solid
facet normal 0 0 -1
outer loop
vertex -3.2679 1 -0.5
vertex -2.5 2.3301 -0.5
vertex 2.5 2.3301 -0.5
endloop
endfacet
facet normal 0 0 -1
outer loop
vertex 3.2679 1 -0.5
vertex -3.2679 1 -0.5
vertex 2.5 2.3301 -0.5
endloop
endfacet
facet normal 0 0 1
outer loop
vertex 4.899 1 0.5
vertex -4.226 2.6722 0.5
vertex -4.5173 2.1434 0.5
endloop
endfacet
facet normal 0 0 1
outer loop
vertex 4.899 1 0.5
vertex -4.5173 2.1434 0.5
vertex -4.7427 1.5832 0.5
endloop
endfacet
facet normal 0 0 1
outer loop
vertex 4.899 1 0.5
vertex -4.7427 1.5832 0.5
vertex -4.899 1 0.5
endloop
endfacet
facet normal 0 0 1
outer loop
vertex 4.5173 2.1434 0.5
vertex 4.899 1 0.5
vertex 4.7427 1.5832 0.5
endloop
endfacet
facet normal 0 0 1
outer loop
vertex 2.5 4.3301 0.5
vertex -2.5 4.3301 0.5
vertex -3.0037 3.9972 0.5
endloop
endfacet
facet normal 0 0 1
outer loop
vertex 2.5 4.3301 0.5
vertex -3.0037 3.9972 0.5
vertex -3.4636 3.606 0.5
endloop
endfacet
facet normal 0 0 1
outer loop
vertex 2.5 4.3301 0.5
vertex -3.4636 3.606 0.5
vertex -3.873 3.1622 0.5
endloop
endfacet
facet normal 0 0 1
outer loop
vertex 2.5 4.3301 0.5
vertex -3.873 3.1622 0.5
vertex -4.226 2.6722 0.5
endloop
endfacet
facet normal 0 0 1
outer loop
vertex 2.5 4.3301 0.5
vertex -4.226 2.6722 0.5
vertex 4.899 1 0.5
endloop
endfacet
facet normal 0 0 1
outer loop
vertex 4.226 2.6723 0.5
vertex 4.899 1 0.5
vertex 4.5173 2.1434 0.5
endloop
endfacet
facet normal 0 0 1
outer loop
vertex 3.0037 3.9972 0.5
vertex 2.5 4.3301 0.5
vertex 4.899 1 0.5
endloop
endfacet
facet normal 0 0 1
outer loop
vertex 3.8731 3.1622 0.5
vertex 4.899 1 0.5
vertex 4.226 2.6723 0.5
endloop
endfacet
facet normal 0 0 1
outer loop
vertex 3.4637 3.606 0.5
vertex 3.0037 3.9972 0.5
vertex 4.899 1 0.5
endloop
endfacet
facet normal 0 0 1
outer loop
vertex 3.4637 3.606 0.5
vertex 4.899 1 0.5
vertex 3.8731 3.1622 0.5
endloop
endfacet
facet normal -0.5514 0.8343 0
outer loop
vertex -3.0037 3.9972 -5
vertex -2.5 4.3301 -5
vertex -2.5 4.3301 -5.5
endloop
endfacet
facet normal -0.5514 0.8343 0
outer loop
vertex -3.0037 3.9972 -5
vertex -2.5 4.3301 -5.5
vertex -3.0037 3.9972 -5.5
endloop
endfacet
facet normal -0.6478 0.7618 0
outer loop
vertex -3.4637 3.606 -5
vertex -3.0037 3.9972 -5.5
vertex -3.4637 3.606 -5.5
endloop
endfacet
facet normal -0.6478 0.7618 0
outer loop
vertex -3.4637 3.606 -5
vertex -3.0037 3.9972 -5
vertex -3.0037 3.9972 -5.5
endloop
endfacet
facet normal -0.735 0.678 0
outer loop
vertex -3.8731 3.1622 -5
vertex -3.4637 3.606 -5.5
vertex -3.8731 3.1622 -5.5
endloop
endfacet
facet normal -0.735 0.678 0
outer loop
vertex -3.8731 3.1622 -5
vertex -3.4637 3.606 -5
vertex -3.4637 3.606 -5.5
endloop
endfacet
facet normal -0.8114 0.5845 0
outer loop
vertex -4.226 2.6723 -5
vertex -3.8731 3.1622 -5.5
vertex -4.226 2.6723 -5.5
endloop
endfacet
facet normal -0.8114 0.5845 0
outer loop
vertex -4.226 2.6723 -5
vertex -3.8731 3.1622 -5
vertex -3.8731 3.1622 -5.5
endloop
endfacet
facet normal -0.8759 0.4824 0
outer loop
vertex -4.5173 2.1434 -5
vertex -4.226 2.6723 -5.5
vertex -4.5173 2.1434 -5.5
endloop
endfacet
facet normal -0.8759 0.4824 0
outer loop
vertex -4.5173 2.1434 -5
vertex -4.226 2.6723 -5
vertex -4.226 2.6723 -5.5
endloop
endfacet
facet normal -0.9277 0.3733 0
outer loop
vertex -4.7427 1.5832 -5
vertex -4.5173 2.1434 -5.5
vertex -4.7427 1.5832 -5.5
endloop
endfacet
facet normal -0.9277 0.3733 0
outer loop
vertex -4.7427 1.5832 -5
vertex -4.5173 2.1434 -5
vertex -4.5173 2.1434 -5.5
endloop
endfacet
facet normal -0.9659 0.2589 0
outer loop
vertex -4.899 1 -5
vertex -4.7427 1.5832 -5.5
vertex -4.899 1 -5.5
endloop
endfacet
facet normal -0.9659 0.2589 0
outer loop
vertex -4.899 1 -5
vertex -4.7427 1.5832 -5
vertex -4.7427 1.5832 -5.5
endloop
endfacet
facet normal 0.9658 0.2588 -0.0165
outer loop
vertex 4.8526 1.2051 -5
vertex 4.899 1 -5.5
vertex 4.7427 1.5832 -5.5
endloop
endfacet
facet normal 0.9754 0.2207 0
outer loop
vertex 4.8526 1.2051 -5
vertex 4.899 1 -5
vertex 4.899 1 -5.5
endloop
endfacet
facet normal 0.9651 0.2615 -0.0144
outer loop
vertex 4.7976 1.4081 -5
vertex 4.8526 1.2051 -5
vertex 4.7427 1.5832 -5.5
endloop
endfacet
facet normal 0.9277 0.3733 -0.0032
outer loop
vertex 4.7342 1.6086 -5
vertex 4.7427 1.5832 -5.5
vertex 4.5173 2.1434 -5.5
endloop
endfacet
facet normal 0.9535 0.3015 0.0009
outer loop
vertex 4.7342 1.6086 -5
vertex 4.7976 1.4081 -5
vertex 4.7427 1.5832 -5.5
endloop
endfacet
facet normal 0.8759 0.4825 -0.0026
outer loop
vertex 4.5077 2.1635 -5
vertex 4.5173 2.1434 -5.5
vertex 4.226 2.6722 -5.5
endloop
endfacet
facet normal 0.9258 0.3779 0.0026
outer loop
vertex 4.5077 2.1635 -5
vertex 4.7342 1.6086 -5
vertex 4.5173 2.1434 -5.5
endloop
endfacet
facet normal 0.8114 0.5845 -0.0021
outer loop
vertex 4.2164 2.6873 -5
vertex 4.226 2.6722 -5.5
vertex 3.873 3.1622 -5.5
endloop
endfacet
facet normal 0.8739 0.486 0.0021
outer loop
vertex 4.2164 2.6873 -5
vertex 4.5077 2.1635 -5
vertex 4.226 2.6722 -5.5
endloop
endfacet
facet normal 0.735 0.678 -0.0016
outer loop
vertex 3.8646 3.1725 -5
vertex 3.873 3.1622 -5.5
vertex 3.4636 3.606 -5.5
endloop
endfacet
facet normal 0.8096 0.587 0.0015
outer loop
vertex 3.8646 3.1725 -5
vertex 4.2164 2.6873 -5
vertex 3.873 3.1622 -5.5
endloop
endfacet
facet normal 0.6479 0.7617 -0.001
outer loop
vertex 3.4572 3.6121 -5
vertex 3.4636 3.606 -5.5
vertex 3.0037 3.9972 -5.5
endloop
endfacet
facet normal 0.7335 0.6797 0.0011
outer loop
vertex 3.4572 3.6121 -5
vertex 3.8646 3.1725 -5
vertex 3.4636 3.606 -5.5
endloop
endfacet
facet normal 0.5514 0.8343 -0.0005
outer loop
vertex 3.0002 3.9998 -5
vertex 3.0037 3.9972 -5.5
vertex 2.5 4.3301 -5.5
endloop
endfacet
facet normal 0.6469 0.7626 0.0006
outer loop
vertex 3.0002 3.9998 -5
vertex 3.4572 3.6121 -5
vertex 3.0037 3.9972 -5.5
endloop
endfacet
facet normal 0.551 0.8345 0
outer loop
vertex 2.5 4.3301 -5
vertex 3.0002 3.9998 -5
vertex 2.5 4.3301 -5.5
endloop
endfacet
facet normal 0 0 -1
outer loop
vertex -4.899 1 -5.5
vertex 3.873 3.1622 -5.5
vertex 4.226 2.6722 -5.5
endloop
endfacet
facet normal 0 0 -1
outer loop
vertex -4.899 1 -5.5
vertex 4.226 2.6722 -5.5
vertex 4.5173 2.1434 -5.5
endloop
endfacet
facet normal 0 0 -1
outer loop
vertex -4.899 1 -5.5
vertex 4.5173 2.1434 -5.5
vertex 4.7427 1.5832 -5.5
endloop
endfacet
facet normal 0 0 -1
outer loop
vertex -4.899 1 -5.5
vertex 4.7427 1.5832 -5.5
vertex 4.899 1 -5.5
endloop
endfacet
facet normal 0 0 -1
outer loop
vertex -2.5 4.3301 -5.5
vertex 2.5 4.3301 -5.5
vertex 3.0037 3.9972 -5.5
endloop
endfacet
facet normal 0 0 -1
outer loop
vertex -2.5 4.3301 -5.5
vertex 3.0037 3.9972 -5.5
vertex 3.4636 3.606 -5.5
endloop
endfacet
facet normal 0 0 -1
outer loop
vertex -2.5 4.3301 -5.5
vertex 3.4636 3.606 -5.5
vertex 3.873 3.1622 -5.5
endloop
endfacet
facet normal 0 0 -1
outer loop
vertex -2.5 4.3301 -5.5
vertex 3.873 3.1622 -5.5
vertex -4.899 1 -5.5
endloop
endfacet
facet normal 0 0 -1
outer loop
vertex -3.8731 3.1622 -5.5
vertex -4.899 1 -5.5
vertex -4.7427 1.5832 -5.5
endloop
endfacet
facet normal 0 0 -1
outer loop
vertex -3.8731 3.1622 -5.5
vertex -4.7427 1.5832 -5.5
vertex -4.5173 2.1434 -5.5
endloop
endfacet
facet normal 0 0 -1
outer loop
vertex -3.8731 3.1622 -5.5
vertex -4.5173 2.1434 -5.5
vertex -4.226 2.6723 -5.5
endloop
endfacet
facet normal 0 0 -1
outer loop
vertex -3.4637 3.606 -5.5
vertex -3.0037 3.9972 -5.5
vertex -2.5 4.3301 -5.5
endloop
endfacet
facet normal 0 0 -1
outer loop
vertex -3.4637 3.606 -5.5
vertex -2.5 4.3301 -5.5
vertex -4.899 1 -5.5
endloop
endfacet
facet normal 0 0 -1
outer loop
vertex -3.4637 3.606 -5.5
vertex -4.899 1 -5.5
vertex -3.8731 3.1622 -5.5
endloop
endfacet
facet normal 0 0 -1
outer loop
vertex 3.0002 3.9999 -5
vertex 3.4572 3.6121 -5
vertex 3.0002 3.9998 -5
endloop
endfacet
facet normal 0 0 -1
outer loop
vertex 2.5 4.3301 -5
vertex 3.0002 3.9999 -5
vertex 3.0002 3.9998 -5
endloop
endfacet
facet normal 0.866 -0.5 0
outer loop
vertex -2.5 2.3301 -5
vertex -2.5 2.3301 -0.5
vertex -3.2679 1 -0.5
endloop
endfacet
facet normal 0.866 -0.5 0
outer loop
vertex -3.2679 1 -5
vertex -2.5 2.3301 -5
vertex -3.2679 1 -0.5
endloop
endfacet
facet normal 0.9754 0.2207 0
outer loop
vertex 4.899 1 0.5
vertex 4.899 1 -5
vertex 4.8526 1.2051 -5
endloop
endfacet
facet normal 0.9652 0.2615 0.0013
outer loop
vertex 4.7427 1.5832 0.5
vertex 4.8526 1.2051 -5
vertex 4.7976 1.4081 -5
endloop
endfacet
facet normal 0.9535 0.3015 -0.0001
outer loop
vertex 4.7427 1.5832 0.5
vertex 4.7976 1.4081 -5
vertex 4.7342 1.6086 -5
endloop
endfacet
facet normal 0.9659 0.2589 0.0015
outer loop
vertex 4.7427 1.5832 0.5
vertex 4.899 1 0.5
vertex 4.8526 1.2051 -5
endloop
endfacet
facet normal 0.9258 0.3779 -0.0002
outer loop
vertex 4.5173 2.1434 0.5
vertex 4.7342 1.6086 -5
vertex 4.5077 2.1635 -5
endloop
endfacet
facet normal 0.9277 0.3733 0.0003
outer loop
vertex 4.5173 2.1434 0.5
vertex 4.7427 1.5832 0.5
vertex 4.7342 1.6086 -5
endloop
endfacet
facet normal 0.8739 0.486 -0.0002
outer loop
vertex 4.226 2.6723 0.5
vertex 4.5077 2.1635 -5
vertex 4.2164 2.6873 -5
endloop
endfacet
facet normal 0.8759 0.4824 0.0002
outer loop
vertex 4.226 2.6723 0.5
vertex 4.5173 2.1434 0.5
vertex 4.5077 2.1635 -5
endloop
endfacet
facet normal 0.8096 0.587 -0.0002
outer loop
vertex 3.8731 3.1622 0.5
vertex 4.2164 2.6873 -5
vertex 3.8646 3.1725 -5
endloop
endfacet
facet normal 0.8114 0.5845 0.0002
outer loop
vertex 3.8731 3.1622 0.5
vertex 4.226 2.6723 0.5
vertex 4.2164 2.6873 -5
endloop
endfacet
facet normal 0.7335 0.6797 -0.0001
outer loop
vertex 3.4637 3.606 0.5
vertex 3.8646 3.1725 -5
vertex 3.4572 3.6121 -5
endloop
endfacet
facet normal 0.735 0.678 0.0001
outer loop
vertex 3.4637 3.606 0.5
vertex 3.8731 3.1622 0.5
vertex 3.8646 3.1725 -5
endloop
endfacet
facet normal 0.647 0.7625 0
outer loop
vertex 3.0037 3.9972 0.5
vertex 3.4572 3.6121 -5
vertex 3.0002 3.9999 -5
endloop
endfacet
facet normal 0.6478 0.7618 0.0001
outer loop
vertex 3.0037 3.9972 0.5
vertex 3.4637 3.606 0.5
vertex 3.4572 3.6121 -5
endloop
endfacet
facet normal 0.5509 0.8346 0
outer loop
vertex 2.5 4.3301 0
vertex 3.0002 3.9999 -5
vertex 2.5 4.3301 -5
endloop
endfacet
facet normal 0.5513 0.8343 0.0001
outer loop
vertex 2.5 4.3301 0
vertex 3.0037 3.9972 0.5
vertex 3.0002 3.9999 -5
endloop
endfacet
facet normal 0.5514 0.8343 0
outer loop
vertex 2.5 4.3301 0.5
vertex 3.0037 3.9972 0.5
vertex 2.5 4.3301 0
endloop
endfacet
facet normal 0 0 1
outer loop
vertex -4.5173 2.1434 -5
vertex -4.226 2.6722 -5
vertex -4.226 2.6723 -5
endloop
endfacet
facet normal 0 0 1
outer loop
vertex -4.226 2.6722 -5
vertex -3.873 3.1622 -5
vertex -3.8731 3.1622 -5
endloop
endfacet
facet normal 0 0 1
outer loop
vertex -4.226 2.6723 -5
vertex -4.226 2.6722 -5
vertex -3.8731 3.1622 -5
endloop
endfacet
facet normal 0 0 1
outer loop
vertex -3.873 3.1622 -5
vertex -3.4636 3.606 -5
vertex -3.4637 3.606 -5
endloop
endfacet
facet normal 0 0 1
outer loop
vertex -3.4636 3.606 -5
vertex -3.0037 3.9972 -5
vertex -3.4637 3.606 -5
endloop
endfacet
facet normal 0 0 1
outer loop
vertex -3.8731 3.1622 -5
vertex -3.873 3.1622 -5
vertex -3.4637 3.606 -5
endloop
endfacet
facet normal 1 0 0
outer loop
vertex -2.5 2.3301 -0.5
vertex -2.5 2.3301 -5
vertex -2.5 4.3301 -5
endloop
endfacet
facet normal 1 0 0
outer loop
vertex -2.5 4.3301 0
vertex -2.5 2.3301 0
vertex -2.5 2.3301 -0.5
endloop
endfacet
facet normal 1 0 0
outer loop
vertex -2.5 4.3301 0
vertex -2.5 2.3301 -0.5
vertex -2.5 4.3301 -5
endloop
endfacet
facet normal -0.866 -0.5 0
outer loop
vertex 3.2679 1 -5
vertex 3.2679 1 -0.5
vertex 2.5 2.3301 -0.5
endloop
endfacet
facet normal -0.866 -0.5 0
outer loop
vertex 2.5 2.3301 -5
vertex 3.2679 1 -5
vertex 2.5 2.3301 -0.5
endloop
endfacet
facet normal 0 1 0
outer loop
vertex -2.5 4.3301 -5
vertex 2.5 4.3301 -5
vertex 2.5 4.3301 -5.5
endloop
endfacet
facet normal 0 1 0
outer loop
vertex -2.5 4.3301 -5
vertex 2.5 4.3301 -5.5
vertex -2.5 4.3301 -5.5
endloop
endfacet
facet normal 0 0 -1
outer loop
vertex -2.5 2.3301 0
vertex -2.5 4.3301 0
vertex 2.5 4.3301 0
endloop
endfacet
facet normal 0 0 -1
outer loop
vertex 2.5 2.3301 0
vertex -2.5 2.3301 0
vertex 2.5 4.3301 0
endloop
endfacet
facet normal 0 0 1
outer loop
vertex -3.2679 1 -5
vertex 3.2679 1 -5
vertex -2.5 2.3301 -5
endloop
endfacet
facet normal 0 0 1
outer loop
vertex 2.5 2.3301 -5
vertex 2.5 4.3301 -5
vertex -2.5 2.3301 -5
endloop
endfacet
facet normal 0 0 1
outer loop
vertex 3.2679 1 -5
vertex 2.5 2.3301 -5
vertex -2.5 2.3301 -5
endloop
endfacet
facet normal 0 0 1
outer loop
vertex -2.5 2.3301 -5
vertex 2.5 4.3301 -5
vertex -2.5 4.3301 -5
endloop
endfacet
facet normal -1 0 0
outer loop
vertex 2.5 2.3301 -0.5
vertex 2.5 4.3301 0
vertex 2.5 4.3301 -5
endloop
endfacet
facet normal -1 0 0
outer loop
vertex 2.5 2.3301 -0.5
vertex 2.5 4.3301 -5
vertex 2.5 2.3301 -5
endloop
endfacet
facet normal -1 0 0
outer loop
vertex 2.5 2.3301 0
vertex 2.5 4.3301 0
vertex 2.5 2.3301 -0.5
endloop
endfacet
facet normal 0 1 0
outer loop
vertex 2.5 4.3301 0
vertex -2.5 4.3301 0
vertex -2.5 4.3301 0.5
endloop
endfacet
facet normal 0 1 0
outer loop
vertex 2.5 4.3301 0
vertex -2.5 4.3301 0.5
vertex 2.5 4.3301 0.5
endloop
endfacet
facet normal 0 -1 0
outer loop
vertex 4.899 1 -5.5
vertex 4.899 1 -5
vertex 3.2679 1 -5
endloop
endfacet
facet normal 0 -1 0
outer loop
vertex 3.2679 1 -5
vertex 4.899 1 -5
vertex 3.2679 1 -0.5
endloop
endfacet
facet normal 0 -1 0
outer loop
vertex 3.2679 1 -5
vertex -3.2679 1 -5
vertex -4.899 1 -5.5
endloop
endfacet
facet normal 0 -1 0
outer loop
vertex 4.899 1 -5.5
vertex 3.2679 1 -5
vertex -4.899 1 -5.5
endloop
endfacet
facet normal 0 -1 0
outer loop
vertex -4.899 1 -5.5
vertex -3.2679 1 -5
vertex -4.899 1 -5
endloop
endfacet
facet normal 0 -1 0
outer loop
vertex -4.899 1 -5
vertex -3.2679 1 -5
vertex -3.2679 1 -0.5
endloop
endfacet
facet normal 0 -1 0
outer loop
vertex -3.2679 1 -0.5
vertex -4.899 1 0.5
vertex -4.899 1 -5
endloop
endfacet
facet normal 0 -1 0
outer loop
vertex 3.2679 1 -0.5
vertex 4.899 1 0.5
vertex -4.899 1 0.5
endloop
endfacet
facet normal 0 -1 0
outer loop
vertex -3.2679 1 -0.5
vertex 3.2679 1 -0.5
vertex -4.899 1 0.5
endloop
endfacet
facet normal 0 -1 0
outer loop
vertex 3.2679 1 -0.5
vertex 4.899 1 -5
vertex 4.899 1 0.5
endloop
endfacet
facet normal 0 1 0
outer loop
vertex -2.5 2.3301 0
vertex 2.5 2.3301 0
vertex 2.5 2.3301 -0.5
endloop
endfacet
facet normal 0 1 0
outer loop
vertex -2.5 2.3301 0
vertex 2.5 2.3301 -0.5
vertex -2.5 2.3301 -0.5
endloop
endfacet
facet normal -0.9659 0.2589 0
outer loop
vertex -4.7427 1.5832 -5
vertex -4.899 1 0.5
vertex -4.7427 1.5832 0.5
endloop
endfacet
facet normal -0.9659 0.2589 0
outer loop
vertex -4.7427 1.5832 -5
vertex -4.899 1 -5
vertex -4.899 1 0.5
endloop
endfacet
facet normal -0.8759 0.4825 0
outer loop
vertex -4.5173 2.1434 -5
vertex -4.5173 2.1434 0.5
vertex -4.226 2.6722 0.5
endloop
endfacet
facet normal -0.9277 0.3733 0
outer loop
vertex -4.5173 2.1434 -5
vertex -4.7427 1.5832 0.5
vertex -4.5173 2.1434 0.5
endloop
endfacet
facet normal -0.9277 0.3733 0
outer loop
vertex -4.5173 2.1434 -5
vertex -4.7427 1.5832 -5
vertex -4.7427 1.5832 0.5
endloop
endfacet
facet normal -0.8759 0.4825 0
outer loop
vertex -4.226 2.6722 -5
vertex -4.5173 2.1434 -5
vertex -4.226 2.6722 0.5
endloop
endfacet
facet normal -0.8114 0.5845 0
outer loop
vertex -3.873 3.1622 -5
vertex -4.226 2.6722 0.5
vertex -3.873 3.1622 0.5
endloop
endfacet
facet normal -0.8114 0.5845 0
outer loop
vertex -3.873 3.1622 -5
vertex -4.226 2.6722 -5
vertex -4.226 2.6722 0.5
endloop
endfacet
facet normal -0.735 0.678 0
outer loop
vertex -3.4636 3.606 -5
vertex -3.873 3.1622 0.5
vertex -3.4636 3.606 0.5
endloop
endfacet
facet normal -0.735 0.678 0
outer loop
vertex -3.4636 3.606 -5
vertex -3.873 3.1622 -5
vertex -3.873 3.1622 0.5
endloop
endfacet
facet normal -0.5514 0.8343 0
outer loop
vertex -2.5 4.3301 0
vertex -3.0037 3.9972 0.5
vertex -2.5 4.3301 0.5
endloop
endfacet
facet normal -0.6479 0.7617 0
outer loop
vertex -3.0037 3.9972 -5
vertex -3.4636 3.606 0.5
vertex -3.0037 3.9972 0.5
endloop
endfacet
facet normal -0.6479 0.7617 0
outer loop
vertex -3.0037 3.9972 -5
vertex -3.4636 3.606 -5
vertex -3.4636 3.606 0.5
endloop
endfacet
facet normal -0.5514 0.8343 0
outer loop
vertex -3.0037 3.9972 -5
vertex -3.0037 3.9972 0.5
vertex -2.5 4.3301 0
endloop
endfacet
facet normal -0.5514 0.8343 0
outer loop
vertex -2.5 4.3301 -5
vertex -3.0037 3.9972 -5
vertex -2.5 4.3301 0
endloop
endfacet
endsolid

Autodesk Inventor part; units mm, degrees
ref_plane "YZ Plane" through (0, 0, 0) normal (1, 0, 0) x (0, 1, 0)
ref_plane "XZ Plane" through (0, 0, 0) normal (0, 1, 0) x (-1, 0, 0)
sketch "Sketch9" plane through (0, 0, 0) normal (0, 0, 1) x (1, 0, 0)
  line L0 (5, 0) -> (2.5, -4.3301)
  line L1 (2.5, -4.3301) -> (-2.5, -4.3301)
  line L2 (-2.5, -4.3301) -> (-5, 0)
  line L3 (-5, 0) -> (-2.5, 4.3301)
  line L4 (-2.5, 4.3301) -> (2.5, 4.3301)
  line L5 (2.5, 4.3301) -> (5, 0)
  line L6 (2.5, 4.3301) -> (2.5, 2.3301)
  line L7 (2.5, 2.3301) -> (-2.5, 2.3301)
  line L8 (-2.5, 2.3301) -> (-2.5, 4.3301)
  line L9 (-2.5, -4.3301) -> (-5, 0)
  line L10 (-0.7679, -3.3301) -> (-2.5, -4.3301)
  line L11 (-3.2679, 1) -> (-0.7679, -3.3301)
  line L12 (-5, 0) -> (-3.2679, 1)
  line L13 (5, 0) -> (2.5, -4.3301)
  line L14 (3.2679, 1) -> (5, 0)
  line L15 (0.7679, -3.3301) -> (3.2679, 1)
  line L16 (2.5, -4.3301) -> (0.7679, -3.3301)
  point P0 (0, 0)
  point P1 (0, 0)
  point P2 (-5, 0)
  dimension "d62" = 5
  dimension "d63" = 2
  dimension "d66" = 360
extrude "Extrusion9" add sketch "Sketch9" against normal blind 0.5 contours L14 L15 L16 L1 L10 L11 L12 L3 L8 L7 L6 L5
sketch "Sketch11" plane through (0, 0, -0.5) normal (0, 0, -1) x (-1, 0, 0)
  line L0 (2.5, 2.3301) -> (-2.5, 2.3301) projected
  line L1 (-2.5, 2.3301) -> (-2.5, 4.3301) projected
  line L2 (-2.5, 2.3301) -> (-2.5, 4.3301)
  line L3 (-5, 0) -> (-2.5, 4.3301) projected
  line L4 (-2.5, 4.3301) -> (-5, 0)
  line L5 (-3.2679, 1) -> (-0.7679, -3.3301) projected
  line L6 (-5, 0) -> (-3.2679, 1)
  line L7 (-3.2679, 1) -> (-2.5, 2.3301)
  line L8 (2.5, 4.3301) -> (2.5, 2.3301) projected
  line L9 (2.5, 4.3301) -> (2.5, 2.3301)
  line L10 (2.5, 2.3301) -> (3.2679, 1)
  line L11 (3.2679, 1) -> (5, 0)
  line L12 (5, 0) -> (2.5, 4.3301)
  line L13 (-0.7679, -3.3301) -> (-2.5, -4.3301)
  line L14 (2.5, -4.3301) -> (0.7679, -3.3301) projected
  line L15 (-2.5, -4.3301) -> (2.5, -4.3301)
  line L16 (2.5, -4.3301) -> (0.7679, -3.3301)
  line L17 (0.7679, -3.3301) -> (-0.7679, -3.3301)
  point P0 (0, 0)
extrude "Extrusion10" add sketch "Sketch11" along normal blind 4.5
sketch "Sketch12" plane through (0, 0, 0) normal (0, 0, 1) x (1, 0, 0)
  line L0 (3.2679, 1) -> (5, 0) projected
  line L1 (-2.5, 4.3301) -> (-5, 0)
  line L2 (-2.5, -4.3301) -> (2.5, -4.3301)
  line L3 (2.5, 4.3301) -> (2.5, 2.3301) projected
  line L4 (5, 0) -> (2.5, 4.3301)
  arc A0 (-2.5, 4.3301) -> (-5, 0) centre (0, 0) ccw
  arc A1 (-2.5, -4.3301) -> (2.5, -4.3301) centre (0, 0) ccw
  arc A2 (5, 0) -> (2.5, 4.3301) centre (0, 0) ccw
extrude "Extrusion11" add sketch "Sketch12" against normal up to surface (5 mm away)
extrude "Extrusion12" add sketch "Sketch9" along normal blind 0.5
extrude "Extrusion13" add sketch "Sketch12" along normal blind 0.5
ref_plane "Work Plane1" through (3.2679, 1, -5) normal (0, 1, 0) x (-1, 0, 0)
split "Split1" plane through (3.2679, 1, -5) removes the side toward (0, -1, 0)
sketch "Sketch13" plane through (0, 0, -5) normal (0, 0, -1) x (-1, 0, 0)
  line L0 (2.5, 4.3301) -> (2.5, 2.3301) projected
  line L1 (-2.5, 4.3301) -> (2.5, 4.3301)
  arc A0 (4.899, 1) -> (2.5, 4.3301) centre (0, 0) ccw projected
  line L2 (-4.899, 1) -> (-3.2679, 1) projected
  line L3 (4.899, 1) -> (-4.899, 1)
  arc A1 (4.899, 1) -> (2.5, 4.3301) centre (0, 0) ccw
  arc A2 (-2.5, 4.3301) -> (-4.899, 1) centre (0, 0) ccw
extrude "Extrusion14" add sketch "Sketch13" along normal blind 0.5
properties part number "BodyFoldedSide2"
